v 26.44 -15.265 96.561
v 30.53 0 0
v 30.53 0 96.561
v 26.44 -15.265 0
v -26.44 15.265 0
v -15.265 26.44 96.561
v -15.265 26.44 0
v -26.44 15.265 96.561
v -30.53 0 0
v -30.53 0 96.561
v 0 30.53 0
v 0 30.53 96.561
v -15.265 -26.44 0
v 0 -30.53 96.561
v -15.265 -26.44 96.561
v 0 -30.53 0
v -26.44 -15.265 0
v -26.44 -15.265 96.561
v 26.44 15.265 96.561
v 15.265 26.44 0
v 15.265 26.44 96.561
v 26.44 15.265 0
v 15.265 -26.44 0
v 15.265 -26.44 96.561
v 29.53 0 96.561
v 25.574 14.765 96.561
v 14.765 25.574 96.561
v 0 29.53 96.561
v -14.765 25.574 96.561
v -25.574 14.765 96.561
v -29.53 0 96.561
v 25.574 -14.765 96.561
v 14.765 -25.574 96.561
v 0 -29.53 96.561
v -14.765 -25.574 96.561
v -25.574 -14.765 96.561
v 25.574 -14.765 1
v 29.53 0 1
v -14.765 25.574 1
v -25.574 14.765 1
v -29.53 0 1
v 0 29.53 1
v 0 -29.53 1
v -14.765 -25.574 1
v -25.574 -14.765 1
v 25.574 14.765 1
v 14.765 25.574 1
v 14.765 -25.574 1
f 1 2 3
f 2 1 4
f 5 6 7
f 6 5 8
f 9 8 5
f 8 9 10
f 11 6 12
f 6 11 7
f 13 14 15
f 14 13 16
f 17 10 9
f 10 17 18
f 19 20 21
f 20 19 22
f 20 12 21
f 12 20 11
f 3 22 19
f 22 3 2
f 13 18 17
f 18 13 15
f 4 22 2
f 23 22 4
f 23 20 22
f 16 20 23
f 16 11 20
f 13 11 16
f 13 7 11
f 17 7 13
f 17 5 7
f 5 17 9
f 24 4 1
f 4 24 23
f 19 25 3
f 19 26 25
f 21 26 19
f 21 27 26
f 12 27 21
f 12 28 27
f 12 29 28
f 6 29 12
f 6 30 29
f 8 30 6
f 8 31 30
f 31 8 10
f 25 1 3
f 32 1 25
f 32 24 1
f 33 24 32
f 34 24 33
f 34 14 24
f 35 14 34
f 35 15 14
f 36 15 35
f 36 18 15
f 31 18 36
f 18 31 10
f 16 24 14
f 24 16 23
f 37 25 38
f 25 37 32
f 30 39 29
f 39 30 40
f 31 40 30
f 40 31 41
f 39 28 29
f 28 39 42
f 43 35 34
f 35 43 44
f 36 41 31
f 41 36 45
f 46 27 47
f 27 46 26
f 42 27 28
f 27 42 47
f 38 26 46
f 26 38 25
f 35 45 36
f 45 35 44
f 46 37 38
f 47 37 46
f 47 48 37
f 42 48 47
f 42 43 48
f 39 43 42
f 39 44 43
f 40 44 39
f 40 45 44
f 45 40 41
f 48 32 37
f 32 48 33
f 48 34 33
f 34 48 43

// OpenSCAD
/* Input Parameters */

volume=250; /* The target volume of the container. */

conversion=1; // [1:Milliliters (mL),29.5735:Fluid Ounces (fl oz),236.5882:Cups (c)]

sides=12; /* The number of sides to use for the polygon based cylinder. */

// (mm)
thickness=1; /* The thickness of the walls and bottom of the container. */

shape=1; // [1:Tall,0:Wide]

// calculations
ratio=0.6180+shape;
volume_mm3=volume*conversion*1000; // convert ml input into mm3 for calculations
internal_radius=pow(volume_mm3/(sin(180/sides)*cos(180/sides)*sides*ratio*2),1/3);
internal_height=internal_radius*ratio*2;
external_radius=internal_radius+thickness;
external_height=internal_height+thickness;

// statistics
echo("Required XY",external_radius*2);
echo("Required Z",external_height);

// rendering
$fn=sides;
translate([0,0,external_height]){
	rotate([0,180,0]){
		difference(){
			cylinder(r=external_radius,h=external_height);
			translate([0,0,-0.1]){
				cylinder(r=internal_radius,h=internal_height+0.1);
			}
		}
	}
}
